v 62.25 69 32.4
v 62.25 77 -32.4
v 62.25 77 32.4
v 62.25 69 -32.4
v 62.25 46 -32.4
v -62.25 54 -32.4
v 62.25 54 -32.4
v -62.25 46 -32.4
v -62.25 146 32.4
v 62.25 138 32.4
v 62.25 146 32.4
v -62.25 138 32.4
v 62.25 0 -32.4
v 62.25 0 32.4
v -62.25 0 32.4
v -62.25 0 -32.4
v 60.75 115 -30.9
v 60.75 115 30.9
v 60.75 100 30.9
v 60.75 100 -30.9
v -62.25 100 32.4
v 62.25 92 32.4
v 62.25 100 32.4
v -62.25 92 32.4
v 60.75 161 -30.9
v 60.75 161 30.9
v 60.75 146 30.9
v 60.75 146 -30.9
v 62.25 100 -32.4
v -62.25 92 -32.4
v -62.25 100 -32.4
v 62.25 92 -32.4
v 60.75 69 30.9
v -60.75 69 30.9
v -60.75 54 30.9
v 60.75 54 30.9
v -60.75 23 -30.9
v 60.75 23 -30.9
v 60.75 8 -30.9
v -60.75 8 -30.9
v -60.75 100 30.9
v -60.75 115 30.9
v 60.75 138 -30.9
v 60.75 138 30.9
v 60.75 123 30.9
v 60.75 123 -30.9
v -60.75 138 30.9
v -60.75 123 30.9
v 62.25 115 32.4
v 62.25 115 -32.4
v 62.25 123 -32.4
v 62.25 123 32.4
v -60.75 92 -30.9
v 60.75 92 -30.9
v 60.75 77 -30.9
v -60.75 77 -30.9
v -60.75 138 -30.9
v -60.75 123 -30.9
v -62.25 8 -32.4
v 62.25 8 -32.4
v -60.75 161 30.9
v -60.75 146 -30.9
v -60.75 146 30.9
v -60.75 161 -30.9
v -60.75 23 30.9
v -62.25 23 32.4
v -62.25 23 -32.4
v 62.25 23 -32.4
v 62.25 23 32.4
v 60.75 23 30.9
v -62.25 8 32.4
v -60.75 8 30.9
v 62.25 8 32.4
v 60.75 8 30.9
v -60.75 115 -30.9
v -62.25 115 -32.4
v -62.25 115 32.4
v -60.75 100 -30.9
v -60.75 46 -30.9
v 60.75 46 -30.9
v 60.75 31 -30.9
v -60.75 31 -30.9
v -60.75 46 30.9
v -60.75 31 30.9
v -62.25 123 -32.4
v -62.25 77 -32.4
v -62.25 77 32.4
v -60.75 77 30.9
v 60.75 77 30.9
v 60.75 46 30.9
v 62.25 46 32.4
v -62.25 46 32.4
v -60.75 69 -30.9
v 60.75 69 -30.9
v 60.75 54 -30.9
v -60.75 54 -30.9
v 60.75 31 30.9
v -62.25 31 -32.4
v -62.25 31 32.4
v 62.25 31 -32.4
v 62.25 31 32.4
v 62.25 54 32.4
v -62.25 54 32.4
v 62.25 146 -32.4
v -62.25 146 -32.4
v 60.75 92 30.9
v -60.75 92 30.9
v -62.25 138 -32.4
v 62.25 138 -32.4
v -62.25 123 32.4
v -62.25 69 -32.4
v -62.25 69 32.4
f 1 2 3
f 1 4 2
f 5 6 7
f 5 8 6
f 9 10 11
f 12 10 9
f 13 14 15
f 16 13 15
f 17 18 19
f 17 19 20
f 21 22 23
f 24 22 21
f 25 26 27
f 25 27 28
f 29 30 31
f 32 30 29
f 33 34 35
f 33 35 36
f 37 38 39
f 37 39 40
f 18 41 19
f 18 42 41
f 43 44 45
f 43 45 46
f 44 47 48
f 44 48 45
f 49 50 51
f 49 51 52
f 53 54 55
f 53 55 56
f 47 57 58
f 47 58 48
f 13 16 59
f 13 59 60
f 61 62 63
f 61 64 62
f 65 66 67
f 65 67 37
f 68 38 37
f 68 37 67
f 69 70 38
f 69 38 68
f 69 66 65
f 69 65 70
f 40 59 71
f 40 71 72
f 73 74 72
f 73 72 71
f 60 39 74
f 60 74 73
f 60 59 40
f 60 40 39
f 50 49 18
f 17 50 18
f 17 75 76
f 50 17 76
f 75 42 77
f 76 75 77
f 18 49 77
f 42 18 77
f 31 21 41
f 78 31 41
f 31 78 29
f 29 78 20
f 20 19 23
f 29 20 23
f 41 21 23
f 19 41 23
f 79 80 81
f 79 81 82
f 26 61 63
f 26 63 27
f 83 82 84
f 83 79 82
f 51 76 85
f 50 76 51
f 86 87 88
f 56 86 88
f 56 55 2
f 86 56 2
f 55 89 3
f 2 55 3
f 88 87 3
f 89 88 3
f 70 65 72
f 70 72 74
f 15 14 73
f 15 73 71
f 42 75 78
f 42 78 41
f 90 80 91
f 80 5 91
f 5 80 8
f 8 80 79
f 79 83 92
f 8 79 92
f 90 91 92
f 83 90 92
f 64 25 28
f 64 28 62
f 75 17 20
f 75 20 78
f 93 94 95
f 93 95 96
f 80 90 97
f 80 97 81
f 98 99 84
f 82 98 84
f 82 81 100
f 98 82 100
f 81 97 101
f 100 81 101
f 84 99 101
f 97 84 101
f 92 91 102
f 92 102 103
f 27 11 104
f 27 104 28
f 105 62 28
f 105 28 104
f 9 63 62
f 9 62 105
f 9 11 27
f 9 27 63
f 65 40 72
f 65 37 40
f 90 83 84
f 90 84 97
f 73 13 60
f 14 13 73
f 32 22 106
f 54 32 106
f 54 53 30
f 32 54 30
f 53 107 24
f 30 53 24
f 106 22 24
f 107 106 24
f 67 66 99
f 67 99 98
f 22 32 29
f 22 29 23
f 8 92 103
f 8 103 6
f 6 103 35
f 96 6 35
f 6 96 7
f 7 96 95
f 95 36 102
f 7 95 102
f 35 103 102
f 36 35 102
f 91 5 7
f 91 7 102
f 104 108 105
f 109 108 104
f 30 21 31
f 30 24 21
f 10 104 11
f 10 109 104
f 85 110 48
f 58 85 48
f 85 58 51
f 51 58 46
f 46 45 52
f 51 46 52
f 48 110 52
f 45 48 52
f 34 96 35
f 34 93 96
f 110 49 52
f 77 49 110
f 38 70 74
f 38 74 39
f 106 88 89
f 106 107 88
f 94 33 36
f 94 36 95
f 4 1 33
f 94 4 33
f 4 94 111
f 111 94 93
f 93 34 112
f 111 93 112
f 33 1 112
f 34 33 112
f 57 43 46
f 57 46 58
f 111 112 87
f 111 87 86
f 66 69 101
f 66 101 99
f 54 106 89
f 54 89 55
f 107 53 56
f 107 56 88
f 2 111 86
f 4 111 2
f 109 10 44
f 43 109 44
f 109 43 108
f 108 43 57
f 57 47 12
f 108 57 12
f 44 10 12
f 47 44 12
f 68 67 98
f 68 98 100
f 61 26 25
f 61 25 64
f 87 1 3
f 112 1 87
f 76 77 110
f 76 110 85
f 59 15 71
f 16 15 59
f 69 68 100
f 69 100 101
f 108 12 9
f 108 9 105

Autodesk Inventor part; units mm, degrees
ref_plane "YZ Plane" through (0, 0, 0) normal (1, 0, 0) x (0, 1, 0)
ref_plane "XZ Plane" through (0, 0, 0) normal (0, 1, 0) x (-1, 0, 0)
ref_plane "XY Plane" through (0, 0, 0) normal (0, 0, 1) x (1, 0, 0)
sketch "Sketch1" plane through (0, 0, 0) normal (0, 1, 0) x (-1, 0, 0)
  line L0 (62.25, -32.4) -> (-62.25, -32.4)
  line L1 (-62.25, -32.4) -> (-62.25, 32.4)
  line L2 (-62.25, 32.4) -> (62.25, 32.4)
  line L3 (62.25, 32.4) -> (62.25, -32.4)
  point P0 (0, 0)
  point P1 (62.25, 0)
  point P2 (0, -32.4)
  dimension "d0" = 124.5
  dimension "d2" = 64.8
extrude "Extrusion1" add sketch "Sketch1" along normal blind 161
sketch "Sketch2" plane through (-62.25, 0, 32.4) normal (0, 0, 1) x (1, 0, 0)
  line L0 (124.5, 0) -> (0, 0) projected
  line L1 (124.5, 0) -> (124.5, 161) projected
  line L2 (0, 0) -> (0, 161) projected
  line L3 (0, 23) -> (124.5, 23)
  line L4 (124.5, 23) -> (124.5, 8)
  line L5 (124.5, 8) -> (0, 8)
  line L6 (0, 8) -> (0, 23)
  line L7 (0, 31) -> (124.5, 31)
  line L8 (124.5, 31) -> (124.5, 46)
  line L9 (124.5, 46) -> (0, 46)
  line L10 (0, 46) -> (0, 31)
  line L11 (0, 54) -> (124.5, 54)
  line L12 (124.5, 54) -> (124.5, 69)
  line L13 (124.5, 69) -> (0, 69)
  line L14 (0, 69) -> (0, 54)
  line L15 (0, 77) -> (124.5, 77)
  line L16 (124.5, 77) -> (124.5, 92)
  line L17 (124.5, 92) -> (0, 92)
  line L18 (0, 92) -> (0, 77)
  line L19 (0, 100) -> (124.5, 100)
  line L20 (124.5, 100) -> (124.5, 115)
  line L21 (124.5, 115) -> (0, 115)
  line L22 (0, 115) -> (0, 100)
  line L23 (0, 123) -> (124.5, 123)
  line L24 (124.5, 123) -> (124.5, 138)
  line L25 (124.5, 138) -> (0, 138)
  line L26 (0, 138) -> (0, 123)
  line L27 (124.5, 146) -> (0, 146)
  line L28 (0, 146) -> (0, 161)
  line L29 (0, 161) -> (124.5, 161)
  line L30 (124.5, 161) -> (124.5, 146)
  point P0 (62.25, 0)
  dimension "d5" = 8
  dimension "d6" = 15
  dimension "d7" = 8
  dimension "d8" = 15
  dimension "d9" = 8
  dimension "d10" = 15
  dimension "d11" = 8
  dimension "d12" = 15
  dimension "d13" = 8
  dimension "d14" = 8
  dimension "d15" = 15
  dimension "d16" = 15
  dimension "d17" = 8
  dimension "d18" = 15
sketch "Sketch3" plane through (62.25, 0, -32.4) normal (0, 0, -1) x (-1, 0, 0)
  line L0 (0, 161) -> (124.5, 161) projected
  line L1 (0, 23) -> (124.5, 23)
  line L2 (124.5, 23) -> (124.5, 8)
  line L3 (124.5, 8) -> (0, 8)
  line L4 (0, 8) -> (0, 23)
  line L5 (0, 31) -> (124.5, 31)
  line L6 (124.5, 31) -> (124.5, 46)
  line L7 (124.5, 46) -> (0, 46)
  line L8 (0, 46) -> (0, 31)
  line L9 (0, 54) -> (124.5, 54)
  line L10 (124.5, 54) -> (124.5, 69)
  line L11 (124.5, 69) -> (0, 69)
  line L12 (0, 69) -> (0, 54)
  line L13 (0, 77) -> (124.5, 77)
  line L14 (124.5, 77) -> (124.5, 92)
  line L15 (124.5, 92) -> (0, 92)
  line L16 (0, 92) -> (0, 77)
  line L17 (0, 100) -> (124.5, 100)
  line L18 (124.5, 100) -> (124.5, 115)
  line L19 (124.5, 115) -> (0, 115)
  line L20 (0, 115) -> (0, 100)
  line L21 (0, 123) -> (124.5, 123)
  line L22 (124.5, 123) -> (124.5, 138)
  line L23 (124.5, 138) -> (0, 138)
  line L24 (0, 138) -> (0, 123)
  line L25 (124.5, 146) -> (0, 146)
  line L26 (0, 146) -> (0, 161)
  line L27 (0, 161) -> (124.5, 161)
  line L28 (124.5, 161) -> (124.5, 146)
  point P0 (62.25, 0)
  point P1 (62.25, 0)
  dimension "d20" = 15
  dimension "d21" = 8
  dimension "d22" = 15
  dimension "d23" = 8
  dimension "d24" = 15
  dimension "d25" = 8
  dimension "d26" = 15
  dimension "d27" = 8
  dimension "d28" = 8
  dimension "d29" = 15
  dimension "d30" = 15
  dimension "d31" = 8
  dimension "d32" = 15
extrude "Extrusion2" cut sketch "Sketch3" against normal blind 1.5
extrude "Extrusion3" cut sketch "Sketch2" against normal blind 1.5 contours L5 L2 L3 L1 | L7 L2 L9 L1 | L11 L2 L13 L1 | L15 L2 L17 L1 | L19 L2 L21 L1 | L23 L2 L25 L1 | L27 L2 L29 L1
sketch "Sketch5" plane through (62.25, 0, 32.4) normal (1, 0, 0) x (0, 0, -1)
  line L0 (1.5, 161) -> (63.3, 161)
  line L1 (63.3, 161) -> (63.3, 146)
  line L2 (63.3, 146) -> (1.5, 146)
  line L3 (1.5, 146) -> (1.5, 161)
  line L4 (1.5, 138) -> (63.3, 138)
  line L5 (63.3, 138) -> (63.3, 123)
  line L6 (63.3, 123) -> (1.5, 123)
  line L7 (1.5, 123) -> (1.5, 138)
  line L8 (1.5, 115) -> (63.3, 115)
  line L9 (63.3, 115) -> (63.3, 100)
  line L10 (63.3, 100) -> (1.5, 100)
  line L11 (1.5, 100) -> (1.5, 115)
  line L12 (1.5, 92) -> (63.3, 92)
  line L13 (63.3, 92) -> (63.3, 77)
  line L14 (63.3, 77) -> (1.5, 77)
  line L15 (1.5, 77) -> (1.5, 92)
  line L16 (1.5, 69) -> (63.3, 69)
  line L17 (63.3, 69) -> (63.3, 54)
  line L18 (63.3, 54) -> (1.5, 54)
  line L19 (1.5, 54) -> (1.5, 69)
  line L20 (1.5, 46) -> (63.3, 46)
  line L21 (63.3, 46) -> (63.3, 31)
  line L22 (63.3, 31) -> (1.5, 31)
  line L23 (1.5, 31) -> (1.5, 46)
  line L24 (1.5, 23) -> (63.3, 23)
  line L25 (63.3, 23) -> (63.3, 8)
  line L26 (63.3, 8) -> (1.5, 8)
  line L27 (1.5, 8) -> (1.5, 23)
  point P0 (32.4, 0)
sketch "Sketch6" plane through (-62.25, 0, -32.4) normal (-1, 0, 0) x (0, 0, 1)
  line L0 (1.5, 161) -> (63.3, 161) projected
  line L1 (1.5, 161) -> (1.5, 146) projected
  line L2 (1.5, 161) -> (63.3, 161)
  line L3 (63.3, 161) -> (63.3, 146)
  line L4 (63.3, 146) -> (1.5, 146)
  line L5 (1.5, 146) -> (1.5, 161)
  line L6 (63.3, 138) -> (1.5, 138)
  line L7 (1.5, 138) -> (1.5, 123)
  line L8 (1.5, 123) -> (63.3, 123)
  line L9 (63.3, 123) -> (63.3, 138)
  line L10 (1.5, 115) -> (63.3, 115)
  line L11 (63.3, 115) -> (63.3, 100)
  line L12 (63.3, 100) -> (1.5, 100)
  line L13 (1.5, 100) -> (1.5, 115)
  line L14 (1.5, 92) -> (63.3, 92)
  line L15 (63.3, 92) -> (63.3, 77)
  line L16 (63.3, 77) -> (1.5, 77)
  line L17 (1.5, 77) -> (1.5, 92)
  line L18 (63.3, 69) -> (1.5, 69)
  line L19 (1.5, 69) -> (1.5, 54)
  line L20 (1.5, 54) -> (63.3, 54)
  line L21 (63.3, 54) -> (63.3, 69)
  line L22 (1.5, 46) -> (63.3, 46)
  line L23 (63.3, 46) -> (63.3, 31)
  line L24 (63.3, 31) -> (1.5, 31)
  line L25 (1.5, 31) -> (1.5, 46)
  line L26 (63.3, 23) -> (1.5, 23)
  line L27 (1.5, 23) -> (1.5, 8)
  line L28 (1.5, 8) -> (63.3, 8)
  line L29 (63.3, 8) -> (63.3, 23)
  point P0 (32.4, 0)
extrude "Extrusion4" cut sketch "Sketch6" against normal blind 1.5
extrude "Extrusion5" cut sketch "Sketch5" against normal blind 1.5
equation "\"d0\" = BtWd"
equation "\"d2\" = BtDp"
equation "\"d3\" = BatteryHt"
equation "\"d5\" = RidgeWd"
equation "\"d6\" = RidgeGapWd"
equation "\"d7\" = d5"
equation "\"d8\" = d6"
equation "\"d9\" = d7"
equation "\"d10\" = d6"
equation "\"d11\" = d5"
equation "\"d12\" = d6"
equation "\"d13\" = d5"
equation "\"d14\" = d5"
equation "\"d15\" = d6"
equation "\"d16\" = d15"
equation "\"d17\" = d14"
equation "\"d18\" = d16"
equation "\"d20\" = d34"
equation "\"d21\" = d19"
equation "\"d22\" = d20"
equation "\"d23\" = d21"
equation "\"d24\" = d20"
equation "\"d25\" = d19"
equation "\"d26\" = d20"
equation "\"d27\" = d19"
equation "\"d28\" = d19"
equation "\"d29\" = d20"
equation "\"d30\" = d29"
equation "\"d31\" = d28"
equation "\"d32\" = d30"
equation "\"d36\" = RidgeThickness"
equation "\"d38\" = RidgeThickness"
equation "\"d40\" = RidgeThickness"
equation "\"d42\" = RidgeThickness"
equation "\"d19\" = d33"
equation "\"BtWd\" = 124.5"
equation "\"BtDp\" = 64.8"
equation "\"BatteryHt\" = 161"
equation "\"RidgeWd\" = 8"
equation "\"RidgeGapWd\" = 15"
equation "\"d34\" = 15"
equation "\"RidgeThickness\" = 1.5"
equation "\"d33\" = 8"
properties part number "L16-TSV-8.1"
